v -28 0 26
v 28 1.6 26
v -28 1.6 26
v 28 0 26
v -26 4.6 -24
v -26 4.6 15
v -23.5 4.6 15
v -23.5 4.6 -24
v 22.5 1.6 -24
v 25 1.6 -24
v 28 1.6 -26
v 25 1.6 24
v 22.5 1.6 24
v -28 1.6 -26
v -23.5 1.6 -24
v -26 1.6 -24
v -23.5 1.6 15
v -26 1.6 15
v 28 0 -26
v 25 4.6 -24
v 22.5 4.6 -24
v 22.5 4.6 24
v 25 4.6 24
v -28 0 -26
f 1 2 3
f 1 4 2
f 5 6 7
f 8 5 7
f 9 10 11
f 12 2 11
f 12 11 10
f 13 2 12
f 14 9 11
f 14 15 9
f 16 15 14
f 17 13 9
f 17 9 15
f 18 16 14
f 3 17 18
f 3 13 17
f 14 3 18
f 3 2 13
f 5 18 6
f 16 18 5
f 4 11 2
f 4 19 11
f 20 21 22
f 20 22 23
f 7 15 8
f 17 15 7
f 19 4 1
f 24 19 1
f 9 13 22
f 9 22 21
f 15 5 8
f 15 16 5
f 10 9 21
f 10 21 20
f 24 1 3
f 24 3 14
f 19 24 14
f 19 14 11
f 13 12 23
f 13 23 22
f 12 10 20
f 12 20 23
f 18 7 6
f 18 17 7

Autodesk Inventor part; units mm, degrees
ref_plane "YZ Plane" through (0, 0, 0) normal (1, 0, 0) x (0, 1, 0)
ref_plane "XZ Plane" through (0, 0, 0) normal (0, 1, 0) x (-1, 0, 0)
ref_plane "XY Plane" through (0, 0, 0) normal (0, 0, 1) x (1, 0, 0)
sketch "Esquisse1" plane through (0, 0, 0) normal (0, 1, 0) x (-1, 0, 0)
  line L0 (28, -26) -> (-28, -26)
  line L1 (-28, -26) -> (-28, 26)
  line L2 (-28, 26) -> (28, 26)
  line L3 (28, 26) -> (28, -26)
  point P0 (0, 0)
  dimension "d0" = 56
  dimension "d1" = 28
  dimension "d2" = 52
  dimension "d3" = 26
extrude "Extrusion1" add sketch "Esquisse1" along normal blind 1.6
sketch "Esquisse2" plane through (0, 1.6, 0) normal (0, 1, 0) x (1, 0, 0)
  line L0 (-26, 24) -> (-23.5, 24)
  line L1 (-23.5, 24) -> (-23.5, -15)
  line L2 (-23.5, -15) -> (-26, -15)
  line L3 (-26, -15) -> (-26, 24)
  line L4 (22.5, 24) -> (25, 24)
  line L5 (25, 24) -> (25, -24)
  line L6 (25, -24) -> (22.5, -24)
  line L7 (22.5, -24) -> (22.5, 24)
  line L8 (28, 26) -> (-28, 26) projected
  line L9 (-28, 26) -> (-28, -26) projected
  point P0 (0, 0)
  dimension "d6" = 2.5
  dimension "d7" = 2.5
  dimension "d8" = 39
  dimension "d9" = 48
  dimension "d10" = 2
  dimension "d11" = 2
  dimension "d12" = 46
extrude "Extrusion2" add sketch "Esquisse2" along normal blind 3
equation "\"d1\" = 0.5 * d0"
equation "\"d3\" = 0.5 * d2"
properties part number "PCB Wifi" material "Nylon, disulfure de molybdène"
